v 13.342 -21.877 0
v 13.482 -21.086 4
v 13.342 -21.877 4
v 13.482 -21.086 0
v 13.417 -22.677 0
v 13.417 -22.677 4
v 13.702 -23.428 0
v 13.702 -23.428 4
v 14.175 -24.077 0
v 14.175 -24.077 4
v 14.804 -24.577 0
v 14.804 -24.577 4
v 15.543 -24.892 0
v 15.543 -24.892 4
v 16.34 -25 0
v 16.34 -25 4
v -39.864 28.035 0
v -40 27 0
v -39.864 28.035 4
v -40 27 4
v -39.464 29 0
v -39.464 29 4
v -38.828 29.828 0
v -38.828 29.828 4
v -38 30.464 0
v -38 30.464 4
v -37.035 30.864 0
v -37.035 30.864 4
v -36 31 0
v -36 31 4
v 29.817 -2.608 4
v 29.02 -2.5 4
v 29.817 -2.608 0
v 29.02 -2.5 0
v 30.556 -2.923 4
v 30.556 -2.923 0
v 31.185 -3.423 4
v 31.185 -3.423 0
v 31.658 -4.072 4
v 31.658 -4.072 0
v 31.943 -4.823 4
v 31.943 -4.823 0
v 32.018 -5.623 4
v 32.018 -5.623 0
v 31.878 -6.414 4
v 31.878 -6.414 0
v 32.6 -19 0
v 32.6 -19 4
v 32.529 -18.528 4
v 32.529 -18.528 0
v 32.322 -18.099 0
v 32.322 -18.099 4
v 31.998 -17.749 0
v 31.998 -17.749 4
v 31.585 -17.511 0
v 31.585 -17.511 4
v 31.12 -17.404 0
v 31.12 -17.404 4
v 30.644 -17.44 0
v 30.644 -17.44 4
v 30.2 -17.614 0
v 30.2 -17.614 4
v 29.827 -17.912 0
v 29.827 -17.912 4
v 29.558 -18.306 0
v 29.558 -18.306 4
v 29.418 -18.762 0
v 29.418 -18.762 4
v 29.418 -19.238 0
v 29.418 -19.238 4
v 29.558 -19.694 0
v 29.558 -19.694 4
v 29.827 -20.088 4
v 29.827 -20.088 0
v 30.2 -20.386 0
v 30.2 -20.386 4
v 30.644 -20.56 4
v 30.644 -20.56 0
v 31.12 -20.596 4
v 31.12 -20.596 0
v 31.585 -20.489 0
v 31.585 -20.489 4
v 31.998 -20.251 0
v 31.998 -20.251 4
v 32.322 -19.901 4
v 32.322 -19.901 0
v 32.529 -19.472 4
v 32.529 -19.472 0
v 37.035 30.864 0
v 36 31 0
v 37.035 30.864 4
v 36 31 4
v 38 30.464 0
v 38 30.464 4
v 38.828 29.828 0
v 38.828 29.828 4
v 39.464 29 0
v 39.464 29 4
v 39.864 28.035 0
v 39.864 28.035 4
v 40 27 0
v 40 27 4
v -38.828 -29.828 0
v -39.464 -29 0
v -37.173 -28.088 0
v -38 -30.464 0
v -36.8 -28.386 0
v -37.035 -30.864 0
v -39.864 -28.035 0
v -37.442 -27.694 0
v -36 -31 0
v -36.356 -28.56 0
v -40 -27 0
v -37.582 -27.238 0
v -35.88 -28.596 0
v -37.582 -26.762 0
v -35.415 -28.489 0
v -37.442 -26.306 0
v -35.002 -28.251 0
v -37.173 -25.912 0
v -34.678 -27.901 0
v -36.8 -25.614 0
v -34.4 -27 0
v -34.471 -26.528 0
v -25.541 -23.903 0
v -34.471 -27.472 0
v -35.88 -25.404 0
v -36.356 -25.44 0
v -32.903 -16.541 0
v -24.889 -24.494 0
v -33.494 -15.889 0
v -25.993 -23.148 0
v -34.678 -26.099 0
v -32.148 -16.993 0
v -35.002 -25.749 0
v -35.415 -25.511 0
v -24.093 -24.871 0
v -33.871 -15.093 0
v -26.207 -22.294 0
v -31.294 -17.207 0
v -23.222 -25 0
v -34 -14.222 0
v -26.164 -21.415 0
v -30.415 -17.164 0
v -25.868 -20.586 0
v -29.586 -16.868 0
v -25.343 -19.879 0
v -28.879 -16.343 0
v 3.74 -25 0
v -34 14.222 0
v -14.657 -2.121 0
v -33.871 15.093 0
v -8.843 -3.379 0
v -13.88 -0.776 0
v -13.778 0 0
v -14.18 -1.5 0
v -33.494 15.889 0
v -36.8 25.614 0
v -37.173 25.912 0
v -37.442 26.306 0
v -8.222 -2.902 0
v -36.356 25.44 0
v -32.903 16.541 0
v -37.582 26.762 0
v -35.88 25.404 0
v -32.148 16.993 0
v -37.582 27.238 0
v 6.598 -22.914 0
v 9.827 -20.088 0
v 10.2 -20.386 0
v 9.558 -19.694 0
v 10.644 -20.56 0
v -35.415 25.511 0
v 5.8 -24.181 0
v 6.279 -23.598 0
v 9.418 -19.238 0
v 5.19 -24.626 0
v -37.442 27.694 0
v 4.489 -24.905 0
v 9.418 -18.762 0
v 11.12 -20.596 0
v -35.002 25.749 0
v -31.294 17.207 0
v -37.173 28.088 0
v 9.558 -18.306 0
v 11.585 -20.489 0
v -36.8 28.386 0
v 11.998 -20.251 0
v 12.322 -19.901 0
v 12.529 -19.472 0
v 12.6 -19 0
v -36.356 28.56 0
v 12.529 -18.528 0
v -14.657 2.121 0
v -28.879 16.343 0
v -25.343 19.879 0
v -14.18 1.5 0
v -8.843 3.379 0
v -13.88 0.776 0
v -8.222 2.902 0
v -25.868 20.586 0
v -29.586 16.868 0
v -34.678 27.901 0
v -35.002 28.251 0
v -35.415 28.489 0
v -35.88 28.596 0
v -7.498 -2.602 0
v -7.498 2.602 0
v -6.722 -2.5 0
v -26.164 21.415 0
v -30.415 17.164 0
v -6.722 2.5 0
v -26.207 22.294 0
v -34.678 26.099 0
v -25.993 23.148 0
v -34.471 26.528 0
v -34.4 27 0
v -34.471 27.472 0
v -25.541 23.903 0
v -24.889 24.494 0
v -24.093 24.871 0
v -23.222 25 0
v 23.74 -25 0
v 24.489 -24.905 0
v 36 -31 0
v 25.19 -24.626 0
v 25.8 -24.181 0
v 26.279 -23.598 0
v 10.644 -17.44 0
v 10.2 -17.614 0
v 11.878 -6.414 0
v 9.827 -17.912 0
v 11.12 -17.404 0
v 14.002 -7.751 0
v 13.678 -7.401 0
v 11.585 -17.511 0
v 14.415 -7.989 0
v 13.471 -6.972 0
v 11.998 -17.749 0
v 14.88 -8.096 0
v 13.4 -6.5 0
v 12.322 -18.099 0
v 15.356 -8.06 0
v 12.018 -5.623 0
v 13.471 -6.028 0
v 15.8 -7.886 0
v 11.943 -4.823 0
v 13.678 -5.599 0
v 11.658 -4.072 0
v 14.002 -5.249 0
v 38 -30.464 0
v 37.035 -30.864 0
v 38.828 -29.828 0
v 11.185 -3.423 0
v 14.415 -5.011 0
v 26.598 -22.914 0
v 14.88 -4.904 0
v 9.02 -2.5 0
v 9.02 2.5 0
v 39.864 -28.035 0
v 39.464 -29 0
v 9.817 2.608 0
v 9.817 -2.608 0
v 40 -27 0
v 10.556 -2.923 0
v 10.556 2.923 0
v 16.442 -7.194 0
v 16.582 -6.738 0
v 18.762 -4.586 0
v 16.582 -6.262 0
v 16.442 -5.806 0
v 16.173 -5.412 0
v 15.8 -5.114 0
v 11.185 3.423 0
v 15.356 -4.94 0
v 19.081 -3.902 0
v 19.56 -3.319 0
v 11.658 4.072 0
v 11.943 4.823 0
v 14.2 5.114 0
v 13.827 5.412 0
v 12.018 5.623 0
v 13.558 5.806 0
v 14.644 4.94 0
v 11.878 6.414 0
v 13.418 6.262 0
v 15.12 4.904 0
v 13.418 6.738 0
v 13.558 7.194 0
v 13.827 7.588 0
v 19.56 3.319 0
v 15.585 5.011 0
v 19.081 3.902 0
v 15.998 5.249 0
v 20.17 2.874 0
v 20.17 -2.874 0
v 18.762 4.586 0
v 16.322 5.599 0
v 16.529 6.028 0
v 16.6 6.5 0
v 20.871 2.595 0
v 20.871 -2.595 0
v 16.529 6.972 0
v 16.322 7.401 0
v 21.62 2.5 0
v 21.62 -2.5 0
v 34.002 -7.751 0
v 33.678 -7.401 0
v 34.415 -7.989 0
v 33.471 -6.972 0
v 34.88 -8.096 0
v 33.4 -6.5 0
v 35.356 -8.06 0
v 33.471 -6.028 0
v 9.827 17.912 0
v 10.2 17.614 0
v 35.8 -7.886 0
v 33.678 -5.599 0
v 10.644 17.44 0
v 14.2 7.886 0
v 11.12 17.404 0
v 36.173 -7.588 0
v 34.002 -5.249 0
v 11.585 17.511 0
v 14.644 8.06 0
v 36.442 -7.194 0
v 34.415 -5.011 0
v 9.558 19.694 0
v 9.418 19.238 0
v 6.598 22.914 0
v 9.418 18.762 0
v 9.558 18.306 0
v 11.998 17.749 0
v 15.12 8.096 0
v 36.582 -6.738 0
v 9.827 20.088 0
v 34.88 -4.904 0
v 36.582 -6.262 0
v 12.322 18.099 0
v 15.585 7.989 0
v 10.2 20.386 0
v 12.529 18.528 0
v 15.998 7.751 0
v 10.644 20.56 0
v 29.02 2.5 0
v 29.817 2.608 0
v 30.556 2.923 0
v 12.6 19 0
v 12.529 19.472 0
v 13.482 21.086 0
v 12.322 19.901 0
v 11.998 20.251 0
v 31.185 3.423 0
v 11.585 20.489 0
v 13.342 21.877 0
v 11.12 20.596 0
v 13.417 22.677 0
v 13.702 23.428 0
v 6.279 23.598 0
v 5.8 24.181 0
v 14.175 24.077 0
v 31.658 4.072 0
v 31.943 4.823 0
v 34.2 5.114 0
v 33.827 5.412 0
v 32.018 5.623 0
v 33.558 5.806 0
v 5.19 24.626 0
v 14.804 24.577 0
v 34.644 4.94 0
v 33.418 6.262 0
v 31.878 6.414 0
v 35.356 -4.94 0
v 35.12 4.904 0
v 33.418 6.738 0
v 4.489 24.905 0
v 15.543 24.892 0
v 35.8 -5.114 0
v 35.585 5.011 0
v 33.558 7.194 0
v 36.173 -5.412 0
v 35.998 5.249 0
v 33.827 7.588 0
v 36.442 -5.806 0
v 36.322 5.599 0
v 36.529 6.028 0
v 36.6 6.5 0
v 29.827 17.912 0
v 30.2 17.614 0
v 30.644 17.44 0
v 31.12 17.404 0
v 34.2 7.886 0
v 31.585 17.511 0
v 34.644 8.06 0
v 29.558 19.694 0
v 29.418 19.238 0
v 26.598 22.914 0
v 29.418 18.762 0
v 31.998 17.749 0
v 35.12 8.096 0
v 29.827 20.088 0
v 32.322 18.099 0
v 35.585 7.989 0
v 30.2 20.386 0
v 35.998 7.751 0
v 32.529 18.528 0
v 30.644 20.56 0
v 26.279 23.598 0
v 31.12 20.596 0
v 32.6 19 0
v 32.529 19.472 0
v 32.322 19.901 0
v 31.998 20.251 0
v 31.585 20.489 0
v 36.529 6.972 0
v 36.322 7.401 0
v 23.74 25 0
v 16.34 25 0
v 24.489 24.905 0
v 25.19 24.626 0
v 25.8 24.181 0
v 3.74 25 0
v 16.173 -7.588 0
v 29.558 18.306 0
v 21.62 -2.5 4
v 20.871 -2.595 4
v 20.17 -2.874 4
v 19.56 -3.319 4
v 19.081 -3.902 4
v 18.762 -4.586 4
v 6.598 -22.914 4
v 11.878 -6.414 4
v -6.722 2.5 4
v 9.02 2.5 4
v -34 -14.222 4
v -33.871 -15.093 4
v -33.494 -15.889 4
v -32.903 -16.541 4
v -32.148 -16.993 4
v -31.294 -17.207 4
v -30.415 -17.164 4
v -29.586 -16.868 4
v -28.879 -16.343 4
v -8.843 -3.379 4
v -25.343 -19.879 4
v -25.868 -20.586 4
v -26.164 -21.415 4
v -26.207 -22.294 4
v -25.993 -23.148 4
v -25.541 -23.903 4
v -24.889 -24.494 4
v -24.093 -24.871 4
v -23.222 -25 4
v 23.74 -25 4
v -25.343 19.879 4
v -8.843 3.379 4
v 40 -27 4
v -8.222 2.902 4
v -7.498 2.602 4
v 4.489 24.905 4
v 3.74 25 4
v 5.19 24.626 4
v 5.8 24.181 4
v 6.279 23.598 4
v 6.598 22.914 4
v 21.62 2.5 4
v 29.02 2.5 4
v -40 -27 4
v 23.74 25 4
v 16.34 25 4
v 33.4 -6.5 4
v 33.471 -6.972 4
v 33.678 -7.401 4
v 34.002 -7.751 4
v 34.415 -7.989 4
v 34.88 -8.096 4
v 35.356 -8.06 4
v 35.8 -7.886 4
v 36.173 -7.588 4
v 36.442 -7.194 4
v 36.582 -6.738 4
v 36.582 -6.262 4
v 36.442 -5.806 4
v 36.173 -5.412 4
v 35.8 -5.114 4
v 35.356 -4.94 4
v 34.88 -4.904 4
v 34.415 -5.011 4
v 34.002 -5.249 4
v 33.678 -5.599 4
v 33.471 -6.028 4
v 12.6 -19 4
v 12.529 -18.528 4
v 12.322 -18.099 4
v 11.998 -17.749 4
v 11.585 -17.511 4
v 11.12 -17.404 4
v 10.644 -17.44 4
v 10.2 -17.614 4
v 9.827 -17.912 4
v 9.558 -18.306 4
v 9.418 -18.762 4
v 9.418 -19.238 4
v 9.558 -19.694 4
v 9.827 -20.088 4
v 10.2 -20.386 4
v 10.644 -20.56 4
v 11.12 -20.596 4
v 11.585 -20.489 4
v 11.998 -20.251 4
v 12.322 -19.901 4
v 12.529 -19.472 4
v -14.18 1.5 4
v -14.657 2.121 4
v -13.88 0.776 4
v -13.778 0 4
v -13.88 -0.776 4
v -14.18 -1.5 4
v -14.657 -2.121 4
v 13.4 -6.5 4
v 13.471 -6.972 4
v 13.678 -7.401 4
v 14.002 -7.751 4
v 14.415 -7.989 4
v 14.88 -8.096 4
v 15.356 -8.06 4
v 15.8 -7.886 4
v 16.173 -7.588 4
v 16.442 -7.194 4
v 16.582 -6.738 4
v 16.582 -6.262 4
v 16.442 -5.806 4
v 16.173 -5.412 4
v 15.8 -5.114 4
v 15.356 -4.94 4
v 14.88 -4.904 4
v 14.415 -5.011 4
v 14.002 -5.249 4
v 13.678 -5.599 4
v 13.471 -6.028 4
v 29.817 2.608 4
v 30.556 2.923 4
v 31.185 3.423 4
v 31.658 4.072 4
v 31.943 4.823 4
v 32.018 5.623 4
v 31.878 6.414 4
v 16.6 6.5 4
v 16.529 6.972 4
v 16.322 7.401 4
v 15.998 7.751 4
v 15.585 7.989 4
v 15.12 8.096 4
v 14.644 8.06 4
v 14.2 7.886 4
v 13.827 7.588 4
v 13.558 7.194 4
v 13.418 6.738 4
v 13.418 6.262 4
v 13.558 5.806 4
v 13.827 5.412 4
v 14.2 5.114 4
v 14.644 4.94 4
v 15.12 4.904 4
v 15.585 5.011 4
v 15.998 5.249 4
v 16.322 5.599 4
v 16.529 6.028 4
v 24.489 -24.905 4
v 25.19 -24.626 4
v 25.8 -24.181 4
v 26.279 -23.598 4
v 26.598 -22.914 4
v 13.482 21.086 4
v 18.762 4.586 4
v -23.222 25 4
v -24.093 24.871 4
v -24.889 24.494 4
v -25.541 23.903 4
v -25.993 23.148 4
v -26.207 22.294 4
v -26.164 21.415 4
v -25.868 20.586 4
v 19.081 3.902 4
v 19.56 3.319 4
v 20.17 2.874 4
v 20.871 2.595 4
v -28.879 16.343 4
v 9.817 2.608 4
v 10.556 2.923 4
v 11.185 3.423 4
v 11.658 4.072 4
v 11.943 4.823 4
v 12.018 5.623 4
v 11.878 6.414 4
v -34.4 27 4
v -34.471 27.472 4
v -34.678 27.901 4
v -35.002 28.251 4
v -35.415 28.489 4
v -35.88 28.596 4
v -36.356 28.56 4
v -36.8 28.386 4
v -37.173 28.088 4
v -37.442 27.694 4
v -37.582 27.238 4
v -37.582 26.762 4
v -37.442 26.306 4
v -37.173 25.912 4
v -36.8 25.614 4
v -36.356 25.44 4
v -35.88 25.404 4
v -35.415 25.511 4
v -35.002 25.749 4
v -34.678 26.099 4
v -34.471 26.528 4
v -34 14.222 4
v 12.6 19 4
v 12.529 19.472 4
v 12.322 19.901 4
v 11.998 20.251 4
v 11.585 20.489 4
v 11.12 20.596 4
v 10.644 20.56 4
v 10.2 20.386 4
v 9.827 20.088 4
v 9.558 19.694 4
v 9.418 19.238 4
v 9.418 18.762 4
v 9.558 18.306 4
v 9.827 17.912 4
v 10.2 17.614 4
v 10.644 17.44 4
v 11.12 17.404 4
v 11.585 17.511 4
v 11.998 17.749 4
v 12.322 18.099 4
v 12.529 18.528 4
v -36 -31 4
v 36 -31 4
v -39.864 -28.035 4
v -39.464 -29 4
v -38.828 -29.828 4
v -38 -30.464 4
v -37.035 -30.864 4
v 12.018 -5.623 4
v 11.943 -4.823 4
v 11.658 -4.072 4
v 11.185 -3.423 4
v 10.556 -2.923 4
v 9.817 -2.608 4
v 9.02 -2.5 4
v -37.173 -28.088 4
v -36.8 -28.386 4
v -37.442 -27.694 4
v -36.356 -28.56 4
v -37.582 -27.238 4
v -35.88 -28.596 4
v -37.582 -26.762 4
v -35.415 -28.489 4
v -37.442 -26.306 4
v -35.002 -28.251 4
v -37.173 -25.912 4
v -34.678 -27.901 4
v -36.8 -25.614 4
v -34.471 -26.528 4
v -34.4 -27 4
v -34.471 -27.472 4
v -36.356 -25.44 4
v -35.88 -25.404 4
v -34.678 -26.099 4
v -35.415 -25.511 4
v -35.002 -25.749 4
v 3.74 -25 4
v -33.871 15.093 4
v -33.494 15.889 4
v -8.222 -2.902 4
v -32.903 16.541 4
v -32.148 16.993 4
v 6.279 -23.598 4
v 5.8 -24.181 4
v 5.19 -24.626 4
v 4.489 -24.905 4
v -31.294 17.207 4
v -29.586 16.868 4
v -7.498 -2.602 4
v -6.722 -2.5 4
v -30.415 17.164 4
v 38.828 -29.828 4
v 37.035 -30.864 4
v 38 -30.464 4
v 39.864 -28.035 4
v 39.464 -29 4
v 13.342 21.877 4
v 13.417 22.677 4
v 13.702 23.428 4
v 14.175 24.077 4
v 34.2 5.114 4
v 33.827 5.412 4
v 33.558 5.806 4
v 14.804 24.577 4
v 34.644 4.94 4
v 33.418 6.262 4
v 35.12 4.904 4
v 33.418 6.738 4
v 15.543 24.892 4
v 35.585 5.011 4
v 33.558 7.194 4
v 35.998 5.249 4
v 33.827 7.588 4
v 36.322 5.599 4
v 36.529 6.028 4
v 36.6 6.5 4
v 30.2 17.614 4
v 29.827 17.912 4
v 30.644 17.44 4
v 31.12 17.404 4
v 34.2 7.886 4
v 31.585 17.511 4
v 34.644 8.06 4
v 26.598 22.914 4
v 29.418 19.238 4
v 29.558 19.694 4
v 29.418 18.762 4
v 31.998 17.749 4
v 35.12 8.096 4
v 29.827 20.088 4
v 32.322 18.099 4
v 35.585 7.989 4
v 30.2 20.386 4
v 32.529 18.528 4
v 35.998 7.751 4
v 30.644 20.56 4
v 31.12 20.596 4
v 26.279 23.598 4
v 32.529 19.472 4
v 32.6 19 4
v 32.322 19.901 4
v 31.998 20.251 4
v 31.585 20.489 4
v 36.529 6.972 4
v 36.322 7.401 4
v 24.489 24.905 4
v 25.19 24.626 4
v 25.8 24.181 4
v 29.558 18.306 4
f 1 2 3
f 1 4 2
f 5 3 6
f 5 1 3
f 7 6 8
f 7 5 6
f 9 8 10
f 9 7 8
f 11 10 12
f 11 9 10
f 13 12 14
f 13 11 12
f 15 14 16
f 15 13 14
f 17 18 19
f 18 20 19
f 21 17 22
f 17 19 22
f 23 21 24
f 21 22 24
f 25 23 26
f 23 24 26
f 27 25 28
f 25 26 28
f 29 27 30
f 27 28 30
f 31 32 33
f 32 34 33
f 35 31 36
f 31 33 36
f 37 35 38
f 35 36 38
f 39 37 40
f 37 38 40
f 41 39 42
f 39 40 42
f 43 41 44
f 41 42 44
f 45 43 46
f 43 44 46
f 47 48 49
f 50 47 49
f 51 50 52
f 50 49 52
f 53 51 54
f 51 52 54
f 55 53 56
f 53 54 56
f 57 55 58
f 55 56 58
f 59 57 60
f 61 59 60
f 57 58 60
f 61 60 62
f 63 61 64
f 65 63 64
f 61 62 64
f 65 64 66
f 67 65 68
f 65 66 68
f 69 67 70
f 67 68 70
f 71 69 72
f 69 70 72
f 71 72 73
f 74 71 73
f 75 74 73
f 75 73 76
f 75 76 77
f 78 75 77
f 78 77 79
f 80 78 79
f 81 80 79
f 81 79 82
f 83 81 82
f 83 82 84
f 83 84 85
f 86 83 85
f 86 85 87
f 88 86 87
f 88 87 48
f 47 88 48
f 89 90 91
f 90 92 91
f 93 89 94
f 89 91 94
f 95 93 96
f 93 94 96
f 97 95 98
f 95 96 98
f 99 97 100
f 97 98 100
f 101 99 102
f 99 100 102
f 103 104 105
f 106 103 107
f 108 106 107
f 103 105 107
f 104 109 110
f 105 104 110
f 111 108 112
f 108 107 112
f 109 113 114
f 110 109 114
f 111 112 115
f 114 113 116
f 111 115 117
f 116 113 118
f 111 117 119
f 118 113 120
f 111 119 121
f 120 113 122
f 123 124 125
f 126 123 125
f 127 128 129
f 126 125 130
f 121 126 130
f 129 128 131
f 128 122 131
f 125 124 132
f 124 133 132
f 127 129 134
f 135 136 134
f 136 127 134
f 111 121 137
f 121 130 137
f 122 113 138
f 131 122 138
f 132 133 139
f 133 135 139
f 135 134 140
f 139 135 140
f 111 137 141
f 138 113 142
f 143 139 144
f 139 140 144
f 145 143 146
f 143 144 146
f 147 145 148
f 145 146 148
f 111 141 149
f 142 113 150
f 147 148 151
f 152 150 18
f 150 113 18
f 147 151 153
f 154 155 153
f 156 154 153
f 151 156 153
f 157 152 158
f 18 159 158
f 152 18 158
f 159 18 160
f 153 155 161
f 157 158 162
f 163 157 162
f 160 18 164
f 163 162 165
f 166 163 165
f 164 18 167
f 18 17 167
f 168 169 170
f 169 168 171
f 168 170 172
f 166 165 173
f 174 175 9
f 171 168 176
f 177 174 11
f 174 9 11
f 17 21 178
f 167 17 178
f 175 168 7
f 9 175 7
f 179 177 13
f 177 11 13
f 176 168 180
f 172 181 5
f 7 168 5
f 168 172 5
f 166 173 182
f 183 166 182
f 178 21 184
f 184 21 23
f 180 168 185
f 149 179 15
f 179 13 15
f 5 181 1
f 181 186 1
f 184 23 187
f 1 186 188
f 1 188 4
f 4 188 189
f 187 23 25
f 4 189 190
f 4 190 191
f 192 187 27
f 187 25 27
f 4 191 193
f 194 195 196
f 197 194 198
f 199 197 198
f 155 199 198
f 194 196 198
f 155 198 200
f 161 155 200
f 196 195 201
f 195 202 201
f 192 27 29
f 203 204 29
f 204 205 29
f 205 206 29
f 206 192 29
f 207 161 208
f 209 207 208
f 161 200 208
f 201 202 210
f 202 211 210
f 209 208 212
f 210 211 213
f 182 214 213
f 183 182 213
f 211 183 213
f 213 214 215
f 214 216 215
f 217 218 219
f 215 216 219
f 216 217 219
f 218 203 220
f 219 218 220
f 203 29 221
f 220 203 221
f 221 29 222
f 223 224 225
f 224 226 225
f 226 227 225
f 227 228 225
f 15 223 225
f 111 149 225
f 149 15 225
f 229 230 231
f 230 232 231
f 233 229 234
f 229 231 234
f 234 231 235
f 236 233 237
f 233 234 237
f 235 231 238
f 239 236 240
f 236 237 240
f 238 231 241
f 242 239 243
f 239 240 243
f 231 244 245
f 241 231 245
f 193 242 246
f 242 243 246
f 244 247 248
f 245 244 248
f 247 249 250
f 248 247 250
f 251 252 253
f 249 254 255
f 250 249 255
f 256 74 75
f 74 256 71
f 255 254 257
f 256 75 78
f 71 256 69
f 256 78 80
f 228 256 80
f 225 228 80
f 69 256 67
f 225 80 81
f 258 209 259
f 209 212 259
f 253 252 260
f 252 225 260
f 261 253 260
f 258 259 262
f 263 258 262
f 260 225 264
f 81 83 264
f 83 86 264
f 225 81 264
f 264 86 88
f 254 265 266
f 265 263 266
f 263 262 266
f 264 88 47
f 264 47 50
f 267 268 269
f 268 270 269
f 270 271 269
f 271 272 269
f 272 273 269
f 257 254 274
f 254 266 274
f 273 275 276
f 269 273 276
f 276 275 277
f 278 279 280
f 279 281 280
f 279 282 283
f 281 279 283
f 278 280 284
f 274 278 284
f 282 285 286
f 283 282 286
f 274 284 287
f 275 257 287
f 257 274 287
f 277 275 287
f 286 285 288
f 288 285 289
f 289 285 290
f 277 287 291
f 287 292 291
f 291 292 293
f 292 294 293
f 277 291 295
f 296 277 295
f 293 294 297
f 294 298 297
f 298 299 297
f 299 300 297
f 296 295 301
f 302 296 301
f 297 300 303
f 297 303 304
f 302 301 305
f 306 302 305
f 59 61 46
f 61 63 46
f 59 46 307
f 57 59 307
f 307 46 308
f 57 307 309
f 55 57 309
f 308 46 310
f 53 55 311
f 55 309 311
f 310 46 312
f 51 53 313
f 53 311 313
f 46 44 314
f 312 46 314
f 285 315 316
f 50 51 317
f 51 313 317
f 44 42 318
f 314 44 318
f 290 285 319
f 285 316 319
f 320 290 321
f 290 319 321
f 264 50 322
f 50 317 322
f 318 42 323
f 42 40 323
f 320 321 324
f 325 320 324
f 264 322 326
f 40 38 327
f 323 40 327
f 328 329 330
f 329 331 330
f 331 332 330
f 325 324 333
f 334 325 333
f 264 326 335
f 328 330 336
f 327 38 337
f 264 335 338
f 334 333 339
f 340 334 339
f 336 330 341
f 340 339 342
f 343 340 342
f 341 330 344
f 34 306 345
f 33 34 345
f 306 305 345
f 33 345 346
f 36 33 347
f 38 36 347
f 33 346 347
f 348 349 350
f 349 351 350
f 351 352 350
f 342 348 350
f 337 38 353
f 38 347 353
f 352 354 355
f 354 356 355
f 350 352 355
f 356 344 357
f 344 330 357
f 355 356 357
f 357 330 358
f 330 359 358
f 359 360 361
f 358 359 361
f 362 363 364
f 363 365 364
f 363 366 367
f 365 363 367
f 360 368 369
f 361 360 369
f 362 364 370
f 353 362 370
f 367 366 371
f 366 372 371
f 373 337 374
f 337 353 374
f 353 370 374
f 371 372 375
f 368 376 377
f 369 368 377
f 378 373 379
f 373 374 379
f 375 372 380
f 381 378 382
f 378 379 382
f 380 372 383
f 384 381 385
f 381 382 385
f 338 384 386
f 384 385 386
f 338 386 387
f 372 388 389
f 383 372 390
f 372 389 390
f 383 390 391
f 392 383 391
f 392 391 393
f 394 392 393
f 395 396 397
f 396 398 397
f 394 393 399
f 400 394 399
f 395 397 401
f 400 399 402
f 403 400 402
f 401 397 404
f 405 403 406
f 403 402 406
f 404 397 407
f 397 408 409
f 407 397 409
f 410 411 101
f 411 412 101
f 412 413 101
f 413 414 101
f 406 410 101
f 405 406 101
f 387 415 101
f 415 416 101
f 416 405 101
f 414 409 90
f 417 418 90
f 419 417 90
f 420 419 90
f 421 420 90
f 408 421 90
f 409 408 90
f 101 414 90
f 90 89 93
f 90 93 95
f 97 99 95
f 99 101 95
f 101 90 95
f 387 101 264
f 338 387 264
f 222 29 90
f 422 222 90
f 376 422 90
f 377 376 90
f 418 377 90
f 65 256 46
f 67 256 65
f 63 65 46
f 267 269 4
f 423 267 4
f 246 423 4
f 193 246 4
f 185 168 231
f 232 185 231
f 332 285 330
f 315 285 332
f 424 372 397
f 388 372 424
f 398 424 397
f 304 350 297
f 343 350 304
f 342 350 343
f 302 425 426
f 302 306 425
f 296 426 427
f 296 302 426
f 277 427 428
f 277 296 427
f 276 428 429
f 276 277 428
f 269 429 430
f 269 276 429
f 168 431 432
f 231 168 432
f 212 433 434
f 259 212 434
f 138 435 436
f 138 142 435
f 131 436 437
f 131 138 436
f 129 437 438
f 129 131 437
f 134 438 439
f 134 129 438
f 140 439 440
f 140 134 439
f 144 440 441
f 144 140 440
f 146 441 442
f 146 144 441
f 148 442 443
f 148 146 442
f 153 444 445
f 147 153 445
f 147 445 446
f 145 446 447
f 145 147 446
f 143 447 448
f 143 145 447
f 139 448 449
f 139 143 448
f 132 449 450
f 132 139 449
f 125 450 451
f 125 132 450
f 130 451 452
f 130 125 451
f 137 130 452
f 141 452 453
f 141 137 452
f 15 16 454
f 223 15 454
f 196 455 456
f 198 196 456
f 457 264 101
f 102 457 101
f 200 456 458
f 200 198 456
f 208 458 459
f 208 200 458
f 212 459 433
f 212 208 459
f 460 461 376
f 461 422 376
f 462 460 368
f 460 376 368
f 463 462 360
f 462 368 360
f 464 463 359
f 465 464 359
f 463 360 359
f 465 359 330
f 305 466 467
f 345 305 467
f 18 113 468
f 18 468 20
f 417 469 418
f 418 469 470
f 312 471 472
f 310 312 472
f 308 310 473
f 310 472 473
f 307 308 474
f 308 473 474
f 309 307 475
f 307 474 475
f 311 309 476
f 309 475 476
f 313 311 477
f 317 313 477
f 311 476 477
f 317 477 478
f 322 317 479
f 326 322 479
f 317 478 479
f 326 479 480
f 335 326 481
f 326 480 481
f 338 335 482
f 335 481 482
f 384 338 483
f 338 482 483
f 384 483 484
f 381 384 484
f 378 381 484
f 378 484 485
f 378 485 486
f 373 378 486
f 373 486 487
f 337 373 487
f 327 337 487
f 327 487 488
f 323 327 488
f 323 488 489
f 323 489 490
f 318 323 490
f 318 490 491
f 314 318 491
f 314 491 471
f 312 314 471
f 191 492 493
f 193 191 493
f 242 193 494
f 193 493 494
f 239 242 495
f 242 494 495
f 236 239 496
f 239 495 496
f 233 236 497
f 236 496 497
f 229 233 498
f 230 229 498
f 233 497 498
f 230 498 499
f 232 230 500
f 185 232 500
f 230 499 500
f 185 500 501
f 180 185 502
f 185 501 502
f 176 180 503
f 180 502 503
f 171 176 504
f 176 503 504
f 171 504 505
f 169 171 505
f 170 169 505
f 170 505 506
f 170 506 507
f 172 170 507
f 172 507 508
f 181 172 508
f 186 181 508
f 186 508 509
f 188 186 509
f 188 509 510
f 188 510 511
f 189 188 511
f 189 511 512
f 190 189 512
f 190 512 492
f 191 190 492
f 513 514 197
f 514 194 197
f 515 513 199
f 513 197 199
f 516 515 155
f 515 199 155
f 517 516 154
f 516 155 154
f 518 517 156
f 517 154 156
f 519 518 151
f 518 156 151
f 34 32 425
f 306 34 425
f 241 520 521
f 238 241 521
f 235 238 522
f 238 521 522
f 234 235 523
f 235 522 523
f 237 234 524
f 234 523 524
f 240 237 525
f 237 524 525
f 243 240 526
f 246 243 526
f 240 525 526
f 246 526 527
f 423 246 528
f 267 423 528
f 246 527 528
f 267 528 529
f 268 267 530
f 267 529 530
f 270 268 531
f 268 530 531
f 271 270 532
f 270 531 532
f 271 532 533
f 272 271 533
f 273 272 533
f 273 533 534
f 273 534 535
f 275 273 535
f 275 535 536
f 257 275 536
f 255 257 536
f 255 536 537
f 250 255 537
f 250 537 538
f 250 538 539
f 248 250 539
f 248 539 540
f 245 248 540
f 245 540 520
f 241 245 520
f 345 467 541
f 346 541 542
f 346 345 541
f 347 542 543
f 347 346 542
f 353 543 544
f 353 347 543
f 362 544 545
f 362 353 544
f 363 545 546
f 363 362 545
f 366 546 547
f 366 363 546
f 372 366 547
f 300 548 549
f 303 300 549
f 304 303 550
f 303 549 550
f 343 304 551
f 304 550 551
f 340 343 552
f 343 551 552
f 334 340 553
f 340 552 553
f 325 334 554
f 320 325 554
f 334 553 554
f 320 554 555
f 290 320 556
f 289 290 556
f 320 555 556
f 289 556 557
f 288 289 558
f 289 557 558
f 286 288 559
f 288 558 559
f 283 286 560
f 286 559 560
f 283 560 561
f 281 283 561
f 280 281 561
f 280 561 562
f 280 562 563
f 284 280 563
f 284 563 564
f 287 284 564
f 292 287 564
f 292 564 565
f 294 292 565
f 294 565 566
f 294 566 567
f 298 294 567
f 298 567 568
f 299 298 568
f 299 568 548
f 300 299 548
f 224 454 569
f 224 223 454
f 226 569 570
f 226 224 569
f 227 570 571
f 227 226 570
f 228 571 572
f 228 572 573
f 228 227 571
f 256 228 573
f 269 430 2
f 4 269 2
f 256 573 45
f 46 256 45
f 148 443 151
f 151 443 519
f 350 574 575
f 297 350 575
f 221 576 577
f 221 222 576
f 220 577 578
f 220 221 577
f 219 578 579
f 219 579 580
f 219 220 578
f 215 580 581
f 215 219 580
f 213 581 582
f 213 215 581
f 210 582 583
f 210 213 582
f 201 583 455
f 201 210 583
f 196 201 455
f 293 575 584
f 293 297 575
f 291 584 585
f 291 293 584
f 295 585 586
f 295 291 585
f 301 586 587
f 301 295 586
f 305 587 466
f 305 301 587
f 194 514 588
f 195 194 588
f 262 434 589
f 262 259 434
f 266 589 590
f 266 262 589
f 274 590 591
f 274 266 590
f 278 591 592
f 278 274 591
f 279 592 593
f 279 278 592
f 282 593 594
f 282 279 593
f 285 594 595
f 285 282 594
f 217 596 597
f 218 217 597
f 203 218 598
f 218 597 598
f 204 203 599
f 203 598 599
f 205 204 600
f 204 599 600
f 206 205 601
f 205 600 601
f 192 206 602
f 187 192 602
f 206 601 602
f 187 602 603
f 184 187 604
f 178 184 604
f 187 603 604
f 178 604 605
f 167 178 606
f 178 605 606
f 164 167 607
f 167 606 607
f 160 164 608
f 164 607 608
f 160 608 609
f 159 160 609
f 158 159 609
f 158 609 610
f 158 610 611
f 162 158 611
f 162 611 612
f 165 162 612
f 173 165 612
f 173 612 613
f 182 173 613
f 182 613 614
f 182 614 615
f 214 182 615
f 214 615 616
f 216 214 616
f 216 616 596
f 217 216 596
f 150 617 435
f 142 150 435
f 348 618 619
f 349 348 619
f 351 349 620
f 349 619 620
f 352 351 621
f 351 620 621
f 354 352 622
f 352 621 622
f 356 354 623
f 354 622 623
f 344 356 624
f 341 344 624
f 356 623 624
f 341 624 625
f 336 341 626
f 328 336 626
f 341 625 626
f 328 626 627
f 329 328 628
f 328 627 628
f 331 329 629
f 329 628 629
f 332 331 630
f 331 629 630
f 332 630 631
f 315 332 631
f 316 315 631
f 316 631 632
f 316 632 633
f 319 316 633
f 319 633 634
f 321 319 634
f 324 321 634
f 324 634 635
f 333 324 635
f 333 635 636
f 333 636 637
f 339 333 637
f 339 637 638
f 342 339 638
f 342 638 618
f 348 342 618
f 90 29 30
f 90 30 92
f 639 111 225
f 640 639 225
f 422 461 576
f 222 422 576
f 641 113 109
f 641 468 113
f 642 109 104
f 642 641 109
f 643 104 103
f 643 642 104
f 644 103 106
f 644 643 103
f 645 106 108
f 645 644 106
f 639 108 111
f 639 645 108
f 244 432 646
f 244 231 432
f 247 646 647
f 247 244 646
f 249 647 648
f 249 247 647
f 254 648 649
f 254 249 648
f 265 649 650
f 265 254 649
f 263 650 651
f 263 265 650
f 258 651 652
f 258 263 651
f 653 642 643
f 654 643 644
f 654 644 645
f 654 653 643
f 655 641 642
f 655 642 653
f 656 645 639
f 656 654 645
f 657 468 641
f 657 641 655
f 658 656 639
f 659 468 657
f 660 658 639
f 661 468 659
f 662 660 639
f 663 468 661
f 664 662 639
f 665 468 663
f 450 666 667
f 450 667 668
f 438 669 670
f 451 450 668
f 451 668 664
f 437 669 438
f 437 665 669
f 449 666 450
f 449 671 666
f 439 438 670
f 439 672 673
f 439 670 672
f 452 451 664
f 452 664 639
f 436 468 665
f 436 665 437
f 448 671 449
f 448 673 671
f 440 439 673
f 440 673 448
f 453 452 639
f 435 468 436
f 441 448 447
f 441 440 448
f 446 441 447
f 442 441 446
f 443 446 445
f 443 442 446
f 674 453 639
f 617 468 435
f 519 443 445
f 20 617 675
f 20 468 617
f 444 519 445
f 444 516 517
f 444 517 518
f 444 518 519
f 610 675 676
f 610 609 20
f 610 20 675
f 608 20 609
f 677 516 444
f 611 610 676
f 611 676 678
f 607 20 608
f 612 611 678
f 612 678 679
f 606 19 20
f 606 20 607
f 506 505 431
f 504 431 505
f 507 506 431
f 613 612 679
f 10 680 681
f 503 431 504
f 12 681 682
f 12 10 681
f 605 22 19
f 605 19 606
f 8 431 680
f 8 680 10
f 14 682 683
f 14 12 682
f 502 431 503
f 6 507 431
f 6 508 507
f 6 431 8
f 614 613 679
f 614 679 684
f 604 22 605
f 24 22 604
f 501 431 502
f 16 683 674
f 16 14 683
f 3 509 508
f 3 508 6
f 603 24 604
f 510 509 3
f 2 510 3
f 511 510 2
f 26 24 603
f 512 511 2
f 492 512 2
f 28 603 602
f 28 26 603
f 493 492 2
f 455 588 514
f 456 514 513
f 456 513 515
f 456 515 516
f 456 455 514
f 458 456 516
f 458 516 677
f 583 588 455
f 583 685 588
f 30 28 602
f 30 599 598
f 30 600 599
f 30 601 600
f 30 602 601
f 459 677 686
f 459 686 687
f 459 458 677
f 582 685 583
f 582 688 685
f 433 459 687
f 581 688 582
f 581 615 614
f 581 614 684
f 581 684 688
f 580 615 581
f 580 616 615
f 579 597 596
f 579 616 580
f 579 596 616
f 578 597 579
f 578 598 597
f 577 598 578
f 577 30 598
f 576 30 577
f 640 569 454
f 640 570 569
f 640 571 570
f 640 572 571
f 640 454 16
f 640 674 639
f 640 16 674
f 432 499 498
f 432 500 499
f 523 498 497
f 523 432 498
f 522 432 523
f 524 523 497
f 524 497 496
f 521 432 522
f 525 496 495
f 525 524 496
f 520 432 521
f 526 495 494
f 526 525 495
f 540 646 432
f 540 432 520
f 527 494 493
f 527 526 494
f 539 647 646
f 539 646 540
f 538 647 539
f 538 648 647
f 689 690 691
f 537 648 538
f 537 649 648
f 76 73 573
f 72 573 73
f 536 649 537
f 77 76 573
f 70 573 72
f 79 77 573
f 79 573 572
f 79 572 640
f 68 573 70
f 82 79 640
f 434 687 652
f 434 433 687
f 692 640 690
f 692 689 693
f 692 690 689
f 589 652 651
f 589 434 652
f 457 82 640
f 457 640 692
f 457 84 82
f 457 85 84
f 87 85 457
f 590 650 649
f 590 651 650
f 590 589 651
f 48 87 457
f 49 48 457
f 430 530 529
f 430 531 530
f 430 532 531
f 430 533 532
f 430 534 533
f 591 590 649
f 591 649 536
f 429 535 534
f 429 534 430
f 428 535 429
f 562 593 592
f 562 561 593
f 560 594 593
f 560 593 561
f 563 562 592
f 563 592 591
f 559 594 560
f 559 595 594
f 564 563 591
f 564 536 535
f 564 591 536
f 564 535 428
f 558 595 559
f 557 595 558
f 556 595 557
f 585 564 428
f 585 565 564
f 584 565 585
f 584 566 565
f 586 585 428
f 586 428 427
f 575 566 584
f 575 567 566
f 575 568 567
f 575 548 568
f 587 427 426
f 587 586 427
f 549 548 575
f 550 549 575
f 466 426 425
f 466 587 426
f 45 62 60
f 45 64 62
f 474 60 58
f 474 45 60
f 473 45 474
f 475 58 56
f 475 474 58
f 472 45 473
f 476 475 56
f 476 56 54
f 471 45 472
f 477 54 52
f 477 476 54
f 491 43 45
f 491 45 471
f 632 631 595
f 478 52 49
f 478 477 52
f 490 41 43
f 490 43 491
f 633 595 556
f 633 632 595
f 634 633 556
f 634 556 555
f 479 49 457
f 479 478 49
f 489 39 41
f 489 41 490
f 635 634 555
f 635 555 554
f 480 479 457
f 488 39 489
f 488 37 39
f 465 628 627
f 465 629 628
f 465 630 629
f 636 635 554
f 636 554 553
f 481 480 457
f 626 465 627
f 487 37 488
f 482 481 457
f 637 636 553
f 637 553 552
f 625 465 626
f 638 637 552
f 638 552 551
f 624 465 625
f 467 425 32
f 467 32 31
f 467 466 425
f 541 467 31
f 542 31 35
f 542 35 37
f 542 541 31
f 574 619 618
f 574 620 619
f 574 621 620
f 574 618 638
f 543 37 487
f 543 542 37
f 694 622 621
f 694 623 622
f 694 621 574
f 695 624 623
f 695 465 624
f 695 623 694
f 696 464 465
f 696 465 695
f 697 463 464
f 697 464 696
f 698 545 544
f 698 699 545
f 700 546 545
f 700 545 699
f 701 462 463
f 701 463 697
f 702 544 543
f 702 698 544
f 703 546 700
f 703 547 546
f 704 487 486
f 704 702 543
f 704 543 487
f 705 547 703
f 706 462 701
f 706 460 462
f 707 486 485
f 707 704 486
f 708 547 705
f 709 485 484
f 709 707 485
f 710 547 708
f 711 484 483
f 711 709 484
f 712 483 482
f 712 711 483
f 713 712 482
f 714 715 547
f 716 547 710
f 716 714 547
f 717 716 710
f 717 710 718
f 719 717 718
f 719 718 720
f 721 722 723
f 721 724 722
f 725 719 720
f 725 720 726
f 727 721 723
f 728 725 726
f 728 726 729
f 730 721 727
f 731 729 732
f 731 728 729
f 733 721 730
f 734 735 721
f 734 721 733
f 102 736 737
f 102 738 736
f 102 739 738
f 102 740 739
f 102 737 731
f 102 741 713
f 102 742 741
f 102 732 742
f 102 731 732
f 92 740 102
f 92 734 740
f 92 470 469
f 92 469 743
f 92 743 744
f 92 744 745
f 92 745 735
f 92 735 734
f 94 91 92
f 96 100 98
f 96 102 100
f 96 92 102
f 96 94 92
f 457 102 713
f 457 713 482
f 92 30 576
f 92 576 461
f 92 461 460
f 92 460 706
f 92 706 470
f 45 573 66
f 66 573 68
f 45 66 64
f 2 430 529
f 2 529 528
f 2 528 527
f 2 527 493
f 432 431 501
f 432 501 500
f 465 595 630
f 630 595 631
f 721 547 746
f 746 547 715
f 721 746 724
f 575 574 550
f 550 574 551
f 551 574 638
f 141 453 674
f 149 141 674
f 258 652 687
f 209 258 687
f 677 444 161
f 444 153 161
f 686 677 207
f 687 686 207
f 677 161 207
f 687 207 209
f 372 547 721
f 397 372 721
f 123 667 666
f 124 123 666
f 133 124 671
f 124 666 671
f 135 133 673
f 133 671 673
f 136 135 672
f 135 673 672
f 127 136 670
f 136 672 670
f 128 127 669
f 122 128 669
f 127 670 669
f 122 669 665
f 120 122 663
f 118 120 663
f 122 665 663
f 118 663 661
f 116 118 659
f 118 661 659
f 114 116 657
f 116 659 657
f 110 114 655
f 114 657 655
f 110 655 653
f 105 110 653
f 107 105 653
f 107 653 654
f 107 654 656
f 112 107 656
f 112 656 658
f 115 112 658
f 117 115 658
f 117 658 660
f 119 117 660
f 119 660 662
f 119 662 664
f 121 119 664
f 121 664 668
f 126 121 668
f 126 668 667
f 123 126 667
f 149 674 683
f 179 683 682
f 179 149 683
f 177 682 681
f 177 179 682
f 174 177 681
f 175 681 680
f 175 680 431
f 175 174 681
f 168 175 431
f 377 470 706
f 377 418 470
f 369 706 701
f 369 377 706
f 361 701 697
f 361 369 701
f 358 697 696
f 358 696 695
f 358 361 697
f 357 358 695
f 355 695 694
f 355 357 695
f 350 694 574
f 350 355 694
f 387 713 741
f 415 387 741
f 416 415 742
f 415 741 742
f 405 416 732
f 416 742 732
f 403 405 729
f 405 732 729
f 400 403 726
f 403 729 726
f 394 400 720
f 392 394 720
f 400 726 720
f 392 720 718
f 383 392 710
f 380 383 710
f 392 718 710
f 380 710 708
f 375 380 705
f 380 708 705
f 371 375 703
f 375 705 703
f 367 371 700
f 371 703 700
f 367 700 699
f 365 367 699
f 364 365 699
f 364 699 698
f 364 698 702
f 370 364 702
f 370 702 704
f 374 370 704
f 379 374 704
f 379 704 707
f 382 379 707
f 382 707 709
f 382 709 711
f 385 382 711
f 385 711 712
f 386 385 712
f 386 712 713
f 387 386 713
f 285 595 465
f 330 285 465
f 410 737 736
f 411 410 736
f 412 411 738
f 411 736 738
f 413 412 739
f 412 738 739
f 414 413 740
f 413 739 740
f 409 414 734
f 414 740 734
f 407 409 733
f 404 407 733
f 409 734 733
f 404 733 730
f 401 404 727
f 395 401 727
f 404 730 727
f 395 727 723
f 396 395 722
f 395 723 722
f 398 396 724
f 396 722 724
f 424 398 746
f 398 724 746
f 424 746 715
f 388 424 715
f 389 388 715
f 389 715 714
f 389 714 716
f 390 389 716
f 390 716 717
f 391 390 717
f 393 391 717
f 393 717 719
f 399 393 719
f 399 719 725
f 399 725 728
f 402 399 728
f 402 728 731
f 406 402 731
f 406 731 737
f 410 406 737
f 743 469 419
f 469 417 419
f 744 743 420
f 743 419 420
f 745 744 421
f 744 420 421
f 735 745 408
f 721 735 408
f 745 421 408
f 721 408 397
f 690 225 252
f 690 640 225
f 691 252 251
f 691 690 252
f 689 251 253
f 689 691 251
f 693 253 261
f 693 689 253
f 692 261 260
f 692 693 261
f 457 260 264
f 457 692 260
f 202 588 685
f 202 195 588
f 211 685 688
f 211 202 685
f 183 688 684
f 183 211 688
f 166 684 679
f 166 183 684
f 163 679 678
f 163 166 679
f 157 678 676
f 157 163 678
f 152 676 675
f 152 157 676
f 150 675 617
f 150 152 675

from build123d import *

# Parameters (mm, degrees)
SKETCH_1_W          = 80
SKETCH_1_H          = 62
EXTRUDE_1_DEPTH     = 4
FILLET_1_R          = 4
FILLET_2_R          = 4
SKETCH_2_R          = 1.6
CUT_EXTRUDE_1_DEPTH = 10
SKETCH_3_R          = 1.6
CUT_EXTRUDE_2_DEPTH = 10
CUT_EXTRUDE_3_DEPTH = 10
FILLET_3_R          = 3
CUT_EXTRUDE_4_DEPTH = 10
FILLET_4_R          = 3


with BuildPart() as part:
    # 草图1 → 凸台-拉伸1 (new body)
    with BuildSketch(Plane.XY):
        Rectangle(SKETCH_1_W, SKETCH_1_H)
    extrude(amount=EXTRUDE_1_DEPTH)

    # 圆角1
    fillet_1_edges = [part.edges().sort_by_distance(p)[0] for p in [
        (-40, -31, 2),
        (-40, 31, 2),
    ]]
    fillet(fillet_1_edges, radius=FILLET_1_R)

    # 圆角2
    fillet_2_edges = [part.edges().sort_by_distance(p)[0] for p in [
        (40, -31, 2),
        (40, 31, 2),
    ]]
    fillet(fillet_2_edges, radius=FILLET_2_R)

    # 草图2 → 切除-拉伸1 (cut)
    with BuildSketch(Plane.XY.offset(4)):
        with Locations((11, -19)):
            Circle(SKETCH_2_R)
        with Locations((31, -19)):
            Circle(SKETCH_2_R)
        with Locations((35, 6.5)):
            Circle(SKETCH_2_R)
        with Locations((15, 6.5)):
            Circle(SKETCH_2_R)
        with Locations((11, 19)):
            Circle(SKETCH_2_R)
        with Locations((31, 19)):
            Circle(SKETCH_2_R)
        with Locations(Location((15, -6.5, 0), (0, 0, 180))):
            Circle(SKETCH_2_R)
        with Locations(Location((35, -6.5, 0), (0, 0, 180))):
            Circle(SKETCH_2_R)
    extrude(amount=-CUT_EXTRUDE_1_DEPTH, mode=Mode.SUBTRACT)

    # 草图3 → 切除-拉伸2 (cut)
    with BuildSketch(Plane.XY.offset(4)):
        with Locations((-36, -27)):
            Circle(SKETCH_3_R)
        with Locations((-36, 27)):
            Circle(SKETCH_3_R)
    extrude(amount=-CUT_EXTRUDE_2_DEPTH, mode=Mode.SUBTRACT)

    # 草图4 → 切除-拉伸3 (cut)
    with BuildSketch(Plane.XY.offset(4)):
        Polygon((-12.535533906, 0), (-34, 21.464466094), (-34, -21.464466094), align=None)
        Polygon((5.93014286, 25), (-30.464466094, 25), (-7.964466094, 2.5), (13.13014286, 2.5), align=None)
        Polygon((-7.964466094, -2.5), (-30.464466094, -25), (5.93014286, -25), (13.13014286, -2.5), align=None)
    extrude(amount=-CUT_EXTRUDE_3_DEPTH, mode=Mode.SUBTRACT)

    # 圆角3
    fillet_3_edges = [part.edges().sort_by_distance(p)[0] for p in [
        (-7.964466094, -2.5, 2),
        (13.13014286, -2.5, 2),
        (5.93014286, -25, 2),
        (-30.464466094, -25, 2),
        (-30.464466094, 25, 2),
        (5.93014286, 25, 2),
        (13.13014286, 2.5, 2),
        (-7.964466094, 2.5, 2),
        (-12.535533906, 0, 2),
        (-34, -21.464466094, 2),
        (-34, 21.464466094, 2),
    ]]
    fillet(fillet_3_edges, radius=FILLET_3_R)

    # 草图5 → 切除-拉伸4 (cut)
    with BuildSketch(Plane.XY.offset(4)):
        Polygon((33.13014286, -2.5), (19.42985714, -2.5), (12.22985714, -25), (25.93014286, -25), align=None)
        Polygon((25.93014286, 25), (12.22985714, 25), (19.42985714, 2.5), (33.13014286, 2.5), align=None)
    extrude(amount=-CUT_EXTRUDE_4_DEPTH, mode=Mode.SUBTRACT)

    # 圆角4
    fillet_4_edges = [part.edges().sort_by_distance(p)[0] for p in [
        (19.42985714, -2.5, 2),
        (33.13014286, -2.5, 2),
        (25.93014286, -25, 2),
        (12.22985714, -25, 2),
        (19.42985714, 2.5, 2),
        (12.22985714, 25, 2),
        (25.93014286, 25, 2),
        (33.13014286, 2.5, 2),
    ]]
    fillet(fillet_4_edges, radius=FILLET_4_R)


solid = part.part
